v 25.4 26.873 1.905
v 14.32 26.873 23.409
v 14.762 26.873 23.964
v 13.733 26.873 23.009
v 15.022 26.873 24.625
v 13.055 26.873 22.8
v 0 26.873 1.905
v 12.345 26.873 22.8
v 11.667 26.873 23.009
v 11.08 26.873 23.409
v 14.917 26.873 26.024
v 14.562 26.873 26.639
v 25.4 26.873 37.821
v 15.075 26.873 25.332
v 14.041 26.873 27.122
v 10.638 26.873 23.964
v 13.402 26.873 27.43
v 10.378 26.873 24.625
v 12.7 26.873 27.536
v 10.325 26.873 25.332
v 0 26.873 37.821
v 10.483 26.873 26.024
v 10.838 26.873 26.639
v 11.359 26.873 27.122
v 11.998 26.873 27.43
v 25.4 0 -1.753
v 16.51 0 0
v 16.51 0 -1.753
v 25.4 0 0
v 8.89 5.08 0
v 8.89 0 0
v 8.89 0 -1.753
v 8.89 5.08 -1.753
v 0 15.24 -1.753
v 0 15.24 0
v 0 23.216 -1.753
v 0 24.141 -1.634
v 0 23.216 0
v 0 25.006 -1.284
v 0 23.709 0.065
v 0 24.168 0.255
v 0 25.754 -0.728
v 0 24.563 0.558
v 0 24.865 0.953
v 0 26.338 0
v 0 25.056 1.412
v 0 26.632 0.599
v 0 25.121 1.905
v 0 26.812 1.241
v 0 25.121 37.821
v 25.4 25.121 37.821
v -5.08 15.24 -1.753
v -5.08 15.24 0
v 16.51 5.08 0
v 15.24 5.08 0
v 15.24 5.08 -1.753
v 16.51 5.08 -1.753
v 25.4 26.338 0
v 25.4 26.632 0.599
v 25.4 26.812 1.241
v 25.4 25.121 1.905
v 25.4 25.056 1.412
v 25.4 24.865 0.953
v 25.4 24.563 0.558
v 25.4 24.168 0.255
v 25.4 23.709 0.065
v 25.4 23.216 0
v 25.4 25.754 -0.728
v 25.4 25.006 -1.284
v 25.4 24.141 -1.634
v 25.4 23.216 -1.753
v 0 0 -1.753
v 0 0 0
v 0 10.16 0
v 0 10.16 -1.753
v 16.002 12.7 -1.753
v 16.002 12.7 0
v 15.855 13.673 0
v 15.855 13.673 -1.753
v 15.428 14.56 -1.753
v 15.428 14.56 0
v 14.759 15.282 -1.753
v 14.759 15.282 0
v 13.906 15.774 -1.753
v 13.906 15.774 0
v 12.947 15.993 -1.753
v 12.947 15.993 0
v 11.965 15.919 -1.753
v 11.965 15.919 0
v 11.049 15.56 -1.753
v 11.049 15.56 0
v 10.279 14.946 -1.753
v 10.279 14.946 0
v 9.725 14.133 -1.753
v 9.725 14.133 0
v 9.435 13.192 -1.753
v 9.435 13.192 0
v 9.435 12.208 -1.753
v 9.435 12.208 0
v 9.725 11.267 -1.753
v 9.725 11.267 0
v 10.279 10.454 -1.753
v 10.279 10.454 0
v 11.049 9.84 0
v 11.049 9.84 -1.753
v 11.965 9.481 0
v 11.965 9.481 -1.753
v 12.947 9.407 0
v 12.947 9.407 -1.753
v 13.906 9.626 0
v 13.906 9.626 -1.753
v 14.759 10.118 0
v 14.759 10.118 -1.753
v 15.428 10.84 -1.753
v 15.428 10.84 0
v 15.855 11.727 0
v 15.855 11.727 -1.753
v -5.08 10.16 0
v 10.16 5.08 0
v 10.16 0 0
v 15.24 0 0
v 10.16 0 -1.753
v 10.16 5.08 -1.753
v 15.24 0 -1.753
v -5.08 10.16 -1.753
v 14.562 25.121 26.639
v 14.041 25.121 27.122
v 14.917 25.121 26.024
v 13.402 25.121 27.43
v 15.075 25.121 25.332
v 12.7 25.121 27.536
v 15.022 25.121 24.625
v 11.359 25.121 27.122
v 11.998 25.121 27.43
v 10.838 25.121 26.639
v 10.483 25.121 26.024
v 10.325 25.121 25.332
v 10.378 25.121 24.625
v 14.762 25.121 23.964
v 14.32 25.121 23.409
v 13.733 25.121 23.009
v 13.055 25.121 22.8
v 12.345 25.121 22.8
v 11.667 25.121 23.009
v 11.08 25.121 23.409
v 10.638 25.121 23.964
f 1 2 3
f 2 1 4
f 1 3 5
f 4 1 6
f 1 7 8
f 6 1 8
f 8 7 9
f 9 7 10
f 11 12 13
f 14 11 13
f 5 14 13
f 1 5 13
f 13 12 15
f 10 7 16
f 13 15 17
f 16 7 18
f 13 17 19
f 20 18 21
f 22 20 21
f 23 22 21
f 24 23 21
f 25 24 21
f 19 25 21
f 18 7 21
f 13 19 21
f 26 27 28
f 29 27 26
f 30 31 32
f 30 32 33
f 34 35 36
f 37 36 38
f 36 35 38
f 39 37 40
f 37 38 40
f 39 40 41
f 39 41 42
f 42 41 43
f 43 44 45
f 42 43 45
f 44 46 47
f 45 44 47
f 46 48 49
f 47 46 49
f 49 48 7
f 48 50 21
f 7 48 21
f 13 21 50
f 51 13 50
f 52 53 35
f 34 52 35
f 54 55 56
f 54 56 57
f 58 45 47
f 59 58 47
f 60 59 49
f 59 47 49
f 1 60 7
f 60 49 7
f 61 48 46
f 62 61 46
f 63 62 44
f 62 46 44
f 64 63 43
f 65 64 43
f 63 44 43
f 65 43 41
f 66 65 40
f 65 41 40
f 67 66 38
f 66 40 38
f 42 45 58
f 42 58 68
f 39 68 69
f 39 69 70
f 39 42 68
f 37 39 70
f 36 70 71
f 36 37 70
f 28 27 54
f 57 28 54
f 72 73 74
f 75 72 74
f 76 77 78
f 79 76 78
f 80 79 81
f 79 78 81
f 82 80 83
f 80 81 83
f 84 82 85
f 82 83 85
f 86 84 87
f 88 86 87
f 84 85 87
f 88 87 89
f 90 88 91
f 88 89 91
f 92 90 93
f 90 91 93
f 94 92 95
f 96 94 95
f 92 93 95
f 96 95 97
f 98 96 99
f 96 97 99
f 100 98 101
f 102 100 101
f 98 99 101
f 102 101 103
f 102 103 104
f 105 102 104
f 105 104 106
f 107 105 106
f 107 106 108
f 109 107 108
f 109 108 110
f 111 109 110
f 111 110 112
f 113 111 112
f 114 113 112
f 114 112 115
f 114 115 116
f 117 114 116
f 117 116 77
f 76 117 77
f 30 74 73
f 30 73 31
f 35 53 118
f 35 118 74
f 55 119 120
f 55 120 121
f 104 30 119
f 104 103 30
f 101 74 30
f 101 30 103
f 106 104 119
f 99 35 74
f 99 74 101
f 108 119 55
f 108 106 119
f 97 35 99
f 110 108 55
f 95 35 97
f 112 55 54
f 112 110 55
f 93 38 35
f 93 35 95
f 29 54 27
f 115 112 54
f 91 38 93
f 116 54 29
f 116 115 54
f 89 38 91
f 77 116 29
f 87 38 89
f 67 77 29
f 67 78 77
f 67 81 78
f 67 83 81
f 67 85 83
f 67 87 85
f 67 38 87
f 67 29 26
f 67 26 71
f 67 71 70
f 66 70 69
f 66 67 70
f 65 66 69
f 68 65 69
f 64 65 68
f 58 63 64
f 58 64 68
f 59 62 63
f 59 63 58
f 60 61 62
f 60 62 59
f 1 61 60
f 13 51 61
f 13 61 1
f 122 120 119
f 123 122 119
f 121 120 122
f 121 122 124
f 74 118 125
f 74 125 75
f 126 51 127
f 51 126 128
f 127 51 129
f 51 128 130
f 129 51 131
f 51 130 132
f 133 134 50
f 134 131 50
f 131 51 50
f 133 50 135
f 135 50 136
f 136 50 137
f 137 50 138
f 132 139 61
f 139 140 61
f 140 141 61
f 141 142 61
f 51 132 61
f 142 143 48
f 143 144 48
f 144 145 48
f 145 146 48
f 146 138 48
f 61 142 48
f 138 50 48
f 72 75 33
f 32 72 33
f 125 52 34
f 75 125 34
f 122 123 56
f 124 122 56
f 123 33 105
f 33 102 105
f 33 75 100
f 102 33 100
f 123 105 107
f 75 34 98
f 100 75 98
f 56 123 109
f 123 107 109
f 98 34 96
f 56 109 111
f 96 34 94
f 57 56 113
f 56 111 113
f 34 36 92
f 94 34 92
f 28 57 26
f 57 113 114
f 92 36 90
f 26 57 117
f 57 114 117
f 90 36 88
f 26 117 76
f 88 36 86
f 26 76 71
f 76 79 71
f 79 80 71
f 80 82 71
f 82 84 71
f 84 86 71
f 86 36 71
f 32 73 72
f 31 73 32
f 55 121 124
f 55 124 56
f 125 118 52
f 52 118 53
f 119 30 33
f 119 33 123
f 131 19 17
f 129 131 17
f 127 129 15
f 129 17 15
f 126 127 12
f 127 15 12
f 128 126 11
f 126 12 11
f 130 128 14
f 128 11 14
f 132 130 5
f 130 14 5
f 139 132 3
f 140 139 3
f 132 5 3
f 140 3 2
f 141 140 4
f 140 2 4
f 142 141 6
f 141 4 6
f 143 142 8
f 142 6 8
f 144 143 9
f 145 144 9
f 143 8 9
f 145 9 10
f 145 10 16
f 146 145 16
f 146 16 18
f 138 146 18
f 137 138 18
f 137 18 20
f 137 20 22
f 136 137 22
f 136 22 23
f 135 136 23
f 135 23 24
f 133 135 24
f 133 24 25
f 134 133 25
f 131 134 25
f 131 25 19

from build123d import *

# Parameters (mm, degrees)
SKETCH1_W              = 25.4
SKETCH1_H              = 63.5
BASE_FLANGE1_DEPTH     = 1.7526
SKETCHED_BEND1_DEPTH   = 25.4
SKETCHED_BEND1_2_DEPTH = 25.4
CUT_EXTRUDE2_REACH     = 54.894
SKETCH9_R              = 3.302
SKETCH9_W              = 1.27
SKETCH9_H              = 5.08
SKETCH10_W             = 5.08
SKETCH10_H             = 5.08
BOSS_EXTRUDE1_DEPTH    = 1.7526
CUT_EXTRUDE3_REACH     = 54.894
SKETCH11_R             = 2.38125


# Read off the part's stored shape, not the designer's step: Sketched Bend1
# Sheet-metal steps are written as plain solids
with BuildPart() as part:
    # Sketch1 → Base-Flange1 (new body)
    with BuildSketch(Plane.XY):
        with Locations((12.7, 31.75)):
            Rectangle(SKETCH1_W, SKETCH1_H)
    extrude(amount=-BASE_FLANGE1_DEPTH)

    # Sketched Bend1 outline → Sketched Bend1 (cut)
    with BuildSketch(Plane.YZ):
        with BuildLine():
            Line((63.5, 0), (26.337912998, 0))
            ThreePointArc((26.337912998, 0), (25.005866723, -1.284495709), (23.215572088, -1.7526))
            Line((23.215572088, -1.7526), (63.5, -1.7526))
            Line((63.5, -1.7526), (63.5, 0))
        make_face()
    extrude(amount=SKETCHED_BEND1_DEPTH, mode=Mode.SUBTRACT)

    # Sketched Bend1 2 outline → Sketched Bend1 2 (add)
    with BuildSketch(Plane.YZ):
        with BuildLine():
            Line((25.120572088, 37.820572088), (25.120572088, 1.905))
            ThreePointArc((25.120572088, 1.905), (24.562610506, 0.557961582), (23.215572088, 0))
            Line((23.215572088, 0), (26.337912998, 0))
            ThreePointArc((26.337912998, 0), (26.736815609, 0.915615432), (26.873172088, 1.905))
            Line((26.873172088, 1.905), (26.873172088, 37.820572088))
            Line((26.873172088, 37.820572088), (25.120572088, 37.820572088))
        make_face()
    extrude(amount=SKETCHED_BEND1_2_DEPTH)

    # Sketch9 → Cut-Extrude2 (cut, up to next)
    with BuildSketch(Plane.XY, mode=Mode.PRIVATE) as cut_extrude2_sk1:
        with Locations((12.7, 12.7)):
            Circle(SKETCH9_R)
    cut_extrude2_tool1 = extrude(cut_extrude2_sk1.sketch, amount=-CUT_EXTRUDE2_REACH, mode=Mode.PRIVATE) & part.part
    # Sketch9 → Cut-Extrude2 (cut, up to next)
    with BuildSketch(Plane.XY, mode=Mode.PRIVATE) as cut_extrude2_sk2:
        with Locations((15.875, 2.54)):
            Rectangle(SKETCH9_W, SKETCH9_H)
    cut_extrude2_tool2 = extrude(cut_extrude2_sk2.sketch, amount=-CUT_EXTRUDE2_REACH, mode=Mode.PRIVATE) & part.part
    # Sketch9 → Cut-Extrude2 (cut, up to next)
    with BuildSketch(Plane.XY, mode=Mode.PRIVATE) as cut_extrude2_sk3:
        with Locations((9.525, 2.54)):
            Rectangle(SKETCH9_W, SKETCH9_H)
    cut_extrude2_tool3 = extrude(cut_extrude2_sk3.sketch, amount=-CUT_EXTRUDE2_REACH, mode=Mode.PRIVATE) & part.part
    add(cut_extrude2_tool1.solids().sort_by_distance((12.7, 12.7, 0))[0], mode=Mode.SUBTRACT)
    add(cut_extrude2_tool2.solids().sort_by_distance((15.875, 2.54, 0))[0], mode=Mode.SUBTRACT)
    add(cut_extrude2_tool3.solids().sort_by_distance((9.525, 2.54, 0))[0], mode=Mode.SUBTRACT)

    # Sketch10 → Boss-Extrude1 (add)
    with BuildSketch(Plane.XY):
        with Locations((-2.54, 12.7)):
            Rectangle(SKETCH10_W, SKETCH10_H)
    extrude(amount=-BOSS_EXTRUDE1_DEPTH)

    # Sketch11 → Cut-Extrude3 (cut, up to next)
    with BuildSketch(Plane(origin=(0, 26.873172088, 0), x_dir=(1, 0, 0), z_dir=(0, 1, 0)), mode=Mode.PRIVATE) as cut_extrude3_sk1:
        with Locations(Location((12.7, -25.154382, 0), (0, 0, 270))):
            Circle(SKETCH11_R)
    cut_extrude3_tool1 = extrude(cut_extrude3_sk1.sketch, amount=-CUT_EXTRUDE3_REACH, mode=Mode.PRIVATE) & part.part
    add(cut_extrude3_tool1.solids().sort_by_distance((12.7, 26.873172, 25.154382))[0], mode=Mode.SUBTRACT)


solid = part.part
